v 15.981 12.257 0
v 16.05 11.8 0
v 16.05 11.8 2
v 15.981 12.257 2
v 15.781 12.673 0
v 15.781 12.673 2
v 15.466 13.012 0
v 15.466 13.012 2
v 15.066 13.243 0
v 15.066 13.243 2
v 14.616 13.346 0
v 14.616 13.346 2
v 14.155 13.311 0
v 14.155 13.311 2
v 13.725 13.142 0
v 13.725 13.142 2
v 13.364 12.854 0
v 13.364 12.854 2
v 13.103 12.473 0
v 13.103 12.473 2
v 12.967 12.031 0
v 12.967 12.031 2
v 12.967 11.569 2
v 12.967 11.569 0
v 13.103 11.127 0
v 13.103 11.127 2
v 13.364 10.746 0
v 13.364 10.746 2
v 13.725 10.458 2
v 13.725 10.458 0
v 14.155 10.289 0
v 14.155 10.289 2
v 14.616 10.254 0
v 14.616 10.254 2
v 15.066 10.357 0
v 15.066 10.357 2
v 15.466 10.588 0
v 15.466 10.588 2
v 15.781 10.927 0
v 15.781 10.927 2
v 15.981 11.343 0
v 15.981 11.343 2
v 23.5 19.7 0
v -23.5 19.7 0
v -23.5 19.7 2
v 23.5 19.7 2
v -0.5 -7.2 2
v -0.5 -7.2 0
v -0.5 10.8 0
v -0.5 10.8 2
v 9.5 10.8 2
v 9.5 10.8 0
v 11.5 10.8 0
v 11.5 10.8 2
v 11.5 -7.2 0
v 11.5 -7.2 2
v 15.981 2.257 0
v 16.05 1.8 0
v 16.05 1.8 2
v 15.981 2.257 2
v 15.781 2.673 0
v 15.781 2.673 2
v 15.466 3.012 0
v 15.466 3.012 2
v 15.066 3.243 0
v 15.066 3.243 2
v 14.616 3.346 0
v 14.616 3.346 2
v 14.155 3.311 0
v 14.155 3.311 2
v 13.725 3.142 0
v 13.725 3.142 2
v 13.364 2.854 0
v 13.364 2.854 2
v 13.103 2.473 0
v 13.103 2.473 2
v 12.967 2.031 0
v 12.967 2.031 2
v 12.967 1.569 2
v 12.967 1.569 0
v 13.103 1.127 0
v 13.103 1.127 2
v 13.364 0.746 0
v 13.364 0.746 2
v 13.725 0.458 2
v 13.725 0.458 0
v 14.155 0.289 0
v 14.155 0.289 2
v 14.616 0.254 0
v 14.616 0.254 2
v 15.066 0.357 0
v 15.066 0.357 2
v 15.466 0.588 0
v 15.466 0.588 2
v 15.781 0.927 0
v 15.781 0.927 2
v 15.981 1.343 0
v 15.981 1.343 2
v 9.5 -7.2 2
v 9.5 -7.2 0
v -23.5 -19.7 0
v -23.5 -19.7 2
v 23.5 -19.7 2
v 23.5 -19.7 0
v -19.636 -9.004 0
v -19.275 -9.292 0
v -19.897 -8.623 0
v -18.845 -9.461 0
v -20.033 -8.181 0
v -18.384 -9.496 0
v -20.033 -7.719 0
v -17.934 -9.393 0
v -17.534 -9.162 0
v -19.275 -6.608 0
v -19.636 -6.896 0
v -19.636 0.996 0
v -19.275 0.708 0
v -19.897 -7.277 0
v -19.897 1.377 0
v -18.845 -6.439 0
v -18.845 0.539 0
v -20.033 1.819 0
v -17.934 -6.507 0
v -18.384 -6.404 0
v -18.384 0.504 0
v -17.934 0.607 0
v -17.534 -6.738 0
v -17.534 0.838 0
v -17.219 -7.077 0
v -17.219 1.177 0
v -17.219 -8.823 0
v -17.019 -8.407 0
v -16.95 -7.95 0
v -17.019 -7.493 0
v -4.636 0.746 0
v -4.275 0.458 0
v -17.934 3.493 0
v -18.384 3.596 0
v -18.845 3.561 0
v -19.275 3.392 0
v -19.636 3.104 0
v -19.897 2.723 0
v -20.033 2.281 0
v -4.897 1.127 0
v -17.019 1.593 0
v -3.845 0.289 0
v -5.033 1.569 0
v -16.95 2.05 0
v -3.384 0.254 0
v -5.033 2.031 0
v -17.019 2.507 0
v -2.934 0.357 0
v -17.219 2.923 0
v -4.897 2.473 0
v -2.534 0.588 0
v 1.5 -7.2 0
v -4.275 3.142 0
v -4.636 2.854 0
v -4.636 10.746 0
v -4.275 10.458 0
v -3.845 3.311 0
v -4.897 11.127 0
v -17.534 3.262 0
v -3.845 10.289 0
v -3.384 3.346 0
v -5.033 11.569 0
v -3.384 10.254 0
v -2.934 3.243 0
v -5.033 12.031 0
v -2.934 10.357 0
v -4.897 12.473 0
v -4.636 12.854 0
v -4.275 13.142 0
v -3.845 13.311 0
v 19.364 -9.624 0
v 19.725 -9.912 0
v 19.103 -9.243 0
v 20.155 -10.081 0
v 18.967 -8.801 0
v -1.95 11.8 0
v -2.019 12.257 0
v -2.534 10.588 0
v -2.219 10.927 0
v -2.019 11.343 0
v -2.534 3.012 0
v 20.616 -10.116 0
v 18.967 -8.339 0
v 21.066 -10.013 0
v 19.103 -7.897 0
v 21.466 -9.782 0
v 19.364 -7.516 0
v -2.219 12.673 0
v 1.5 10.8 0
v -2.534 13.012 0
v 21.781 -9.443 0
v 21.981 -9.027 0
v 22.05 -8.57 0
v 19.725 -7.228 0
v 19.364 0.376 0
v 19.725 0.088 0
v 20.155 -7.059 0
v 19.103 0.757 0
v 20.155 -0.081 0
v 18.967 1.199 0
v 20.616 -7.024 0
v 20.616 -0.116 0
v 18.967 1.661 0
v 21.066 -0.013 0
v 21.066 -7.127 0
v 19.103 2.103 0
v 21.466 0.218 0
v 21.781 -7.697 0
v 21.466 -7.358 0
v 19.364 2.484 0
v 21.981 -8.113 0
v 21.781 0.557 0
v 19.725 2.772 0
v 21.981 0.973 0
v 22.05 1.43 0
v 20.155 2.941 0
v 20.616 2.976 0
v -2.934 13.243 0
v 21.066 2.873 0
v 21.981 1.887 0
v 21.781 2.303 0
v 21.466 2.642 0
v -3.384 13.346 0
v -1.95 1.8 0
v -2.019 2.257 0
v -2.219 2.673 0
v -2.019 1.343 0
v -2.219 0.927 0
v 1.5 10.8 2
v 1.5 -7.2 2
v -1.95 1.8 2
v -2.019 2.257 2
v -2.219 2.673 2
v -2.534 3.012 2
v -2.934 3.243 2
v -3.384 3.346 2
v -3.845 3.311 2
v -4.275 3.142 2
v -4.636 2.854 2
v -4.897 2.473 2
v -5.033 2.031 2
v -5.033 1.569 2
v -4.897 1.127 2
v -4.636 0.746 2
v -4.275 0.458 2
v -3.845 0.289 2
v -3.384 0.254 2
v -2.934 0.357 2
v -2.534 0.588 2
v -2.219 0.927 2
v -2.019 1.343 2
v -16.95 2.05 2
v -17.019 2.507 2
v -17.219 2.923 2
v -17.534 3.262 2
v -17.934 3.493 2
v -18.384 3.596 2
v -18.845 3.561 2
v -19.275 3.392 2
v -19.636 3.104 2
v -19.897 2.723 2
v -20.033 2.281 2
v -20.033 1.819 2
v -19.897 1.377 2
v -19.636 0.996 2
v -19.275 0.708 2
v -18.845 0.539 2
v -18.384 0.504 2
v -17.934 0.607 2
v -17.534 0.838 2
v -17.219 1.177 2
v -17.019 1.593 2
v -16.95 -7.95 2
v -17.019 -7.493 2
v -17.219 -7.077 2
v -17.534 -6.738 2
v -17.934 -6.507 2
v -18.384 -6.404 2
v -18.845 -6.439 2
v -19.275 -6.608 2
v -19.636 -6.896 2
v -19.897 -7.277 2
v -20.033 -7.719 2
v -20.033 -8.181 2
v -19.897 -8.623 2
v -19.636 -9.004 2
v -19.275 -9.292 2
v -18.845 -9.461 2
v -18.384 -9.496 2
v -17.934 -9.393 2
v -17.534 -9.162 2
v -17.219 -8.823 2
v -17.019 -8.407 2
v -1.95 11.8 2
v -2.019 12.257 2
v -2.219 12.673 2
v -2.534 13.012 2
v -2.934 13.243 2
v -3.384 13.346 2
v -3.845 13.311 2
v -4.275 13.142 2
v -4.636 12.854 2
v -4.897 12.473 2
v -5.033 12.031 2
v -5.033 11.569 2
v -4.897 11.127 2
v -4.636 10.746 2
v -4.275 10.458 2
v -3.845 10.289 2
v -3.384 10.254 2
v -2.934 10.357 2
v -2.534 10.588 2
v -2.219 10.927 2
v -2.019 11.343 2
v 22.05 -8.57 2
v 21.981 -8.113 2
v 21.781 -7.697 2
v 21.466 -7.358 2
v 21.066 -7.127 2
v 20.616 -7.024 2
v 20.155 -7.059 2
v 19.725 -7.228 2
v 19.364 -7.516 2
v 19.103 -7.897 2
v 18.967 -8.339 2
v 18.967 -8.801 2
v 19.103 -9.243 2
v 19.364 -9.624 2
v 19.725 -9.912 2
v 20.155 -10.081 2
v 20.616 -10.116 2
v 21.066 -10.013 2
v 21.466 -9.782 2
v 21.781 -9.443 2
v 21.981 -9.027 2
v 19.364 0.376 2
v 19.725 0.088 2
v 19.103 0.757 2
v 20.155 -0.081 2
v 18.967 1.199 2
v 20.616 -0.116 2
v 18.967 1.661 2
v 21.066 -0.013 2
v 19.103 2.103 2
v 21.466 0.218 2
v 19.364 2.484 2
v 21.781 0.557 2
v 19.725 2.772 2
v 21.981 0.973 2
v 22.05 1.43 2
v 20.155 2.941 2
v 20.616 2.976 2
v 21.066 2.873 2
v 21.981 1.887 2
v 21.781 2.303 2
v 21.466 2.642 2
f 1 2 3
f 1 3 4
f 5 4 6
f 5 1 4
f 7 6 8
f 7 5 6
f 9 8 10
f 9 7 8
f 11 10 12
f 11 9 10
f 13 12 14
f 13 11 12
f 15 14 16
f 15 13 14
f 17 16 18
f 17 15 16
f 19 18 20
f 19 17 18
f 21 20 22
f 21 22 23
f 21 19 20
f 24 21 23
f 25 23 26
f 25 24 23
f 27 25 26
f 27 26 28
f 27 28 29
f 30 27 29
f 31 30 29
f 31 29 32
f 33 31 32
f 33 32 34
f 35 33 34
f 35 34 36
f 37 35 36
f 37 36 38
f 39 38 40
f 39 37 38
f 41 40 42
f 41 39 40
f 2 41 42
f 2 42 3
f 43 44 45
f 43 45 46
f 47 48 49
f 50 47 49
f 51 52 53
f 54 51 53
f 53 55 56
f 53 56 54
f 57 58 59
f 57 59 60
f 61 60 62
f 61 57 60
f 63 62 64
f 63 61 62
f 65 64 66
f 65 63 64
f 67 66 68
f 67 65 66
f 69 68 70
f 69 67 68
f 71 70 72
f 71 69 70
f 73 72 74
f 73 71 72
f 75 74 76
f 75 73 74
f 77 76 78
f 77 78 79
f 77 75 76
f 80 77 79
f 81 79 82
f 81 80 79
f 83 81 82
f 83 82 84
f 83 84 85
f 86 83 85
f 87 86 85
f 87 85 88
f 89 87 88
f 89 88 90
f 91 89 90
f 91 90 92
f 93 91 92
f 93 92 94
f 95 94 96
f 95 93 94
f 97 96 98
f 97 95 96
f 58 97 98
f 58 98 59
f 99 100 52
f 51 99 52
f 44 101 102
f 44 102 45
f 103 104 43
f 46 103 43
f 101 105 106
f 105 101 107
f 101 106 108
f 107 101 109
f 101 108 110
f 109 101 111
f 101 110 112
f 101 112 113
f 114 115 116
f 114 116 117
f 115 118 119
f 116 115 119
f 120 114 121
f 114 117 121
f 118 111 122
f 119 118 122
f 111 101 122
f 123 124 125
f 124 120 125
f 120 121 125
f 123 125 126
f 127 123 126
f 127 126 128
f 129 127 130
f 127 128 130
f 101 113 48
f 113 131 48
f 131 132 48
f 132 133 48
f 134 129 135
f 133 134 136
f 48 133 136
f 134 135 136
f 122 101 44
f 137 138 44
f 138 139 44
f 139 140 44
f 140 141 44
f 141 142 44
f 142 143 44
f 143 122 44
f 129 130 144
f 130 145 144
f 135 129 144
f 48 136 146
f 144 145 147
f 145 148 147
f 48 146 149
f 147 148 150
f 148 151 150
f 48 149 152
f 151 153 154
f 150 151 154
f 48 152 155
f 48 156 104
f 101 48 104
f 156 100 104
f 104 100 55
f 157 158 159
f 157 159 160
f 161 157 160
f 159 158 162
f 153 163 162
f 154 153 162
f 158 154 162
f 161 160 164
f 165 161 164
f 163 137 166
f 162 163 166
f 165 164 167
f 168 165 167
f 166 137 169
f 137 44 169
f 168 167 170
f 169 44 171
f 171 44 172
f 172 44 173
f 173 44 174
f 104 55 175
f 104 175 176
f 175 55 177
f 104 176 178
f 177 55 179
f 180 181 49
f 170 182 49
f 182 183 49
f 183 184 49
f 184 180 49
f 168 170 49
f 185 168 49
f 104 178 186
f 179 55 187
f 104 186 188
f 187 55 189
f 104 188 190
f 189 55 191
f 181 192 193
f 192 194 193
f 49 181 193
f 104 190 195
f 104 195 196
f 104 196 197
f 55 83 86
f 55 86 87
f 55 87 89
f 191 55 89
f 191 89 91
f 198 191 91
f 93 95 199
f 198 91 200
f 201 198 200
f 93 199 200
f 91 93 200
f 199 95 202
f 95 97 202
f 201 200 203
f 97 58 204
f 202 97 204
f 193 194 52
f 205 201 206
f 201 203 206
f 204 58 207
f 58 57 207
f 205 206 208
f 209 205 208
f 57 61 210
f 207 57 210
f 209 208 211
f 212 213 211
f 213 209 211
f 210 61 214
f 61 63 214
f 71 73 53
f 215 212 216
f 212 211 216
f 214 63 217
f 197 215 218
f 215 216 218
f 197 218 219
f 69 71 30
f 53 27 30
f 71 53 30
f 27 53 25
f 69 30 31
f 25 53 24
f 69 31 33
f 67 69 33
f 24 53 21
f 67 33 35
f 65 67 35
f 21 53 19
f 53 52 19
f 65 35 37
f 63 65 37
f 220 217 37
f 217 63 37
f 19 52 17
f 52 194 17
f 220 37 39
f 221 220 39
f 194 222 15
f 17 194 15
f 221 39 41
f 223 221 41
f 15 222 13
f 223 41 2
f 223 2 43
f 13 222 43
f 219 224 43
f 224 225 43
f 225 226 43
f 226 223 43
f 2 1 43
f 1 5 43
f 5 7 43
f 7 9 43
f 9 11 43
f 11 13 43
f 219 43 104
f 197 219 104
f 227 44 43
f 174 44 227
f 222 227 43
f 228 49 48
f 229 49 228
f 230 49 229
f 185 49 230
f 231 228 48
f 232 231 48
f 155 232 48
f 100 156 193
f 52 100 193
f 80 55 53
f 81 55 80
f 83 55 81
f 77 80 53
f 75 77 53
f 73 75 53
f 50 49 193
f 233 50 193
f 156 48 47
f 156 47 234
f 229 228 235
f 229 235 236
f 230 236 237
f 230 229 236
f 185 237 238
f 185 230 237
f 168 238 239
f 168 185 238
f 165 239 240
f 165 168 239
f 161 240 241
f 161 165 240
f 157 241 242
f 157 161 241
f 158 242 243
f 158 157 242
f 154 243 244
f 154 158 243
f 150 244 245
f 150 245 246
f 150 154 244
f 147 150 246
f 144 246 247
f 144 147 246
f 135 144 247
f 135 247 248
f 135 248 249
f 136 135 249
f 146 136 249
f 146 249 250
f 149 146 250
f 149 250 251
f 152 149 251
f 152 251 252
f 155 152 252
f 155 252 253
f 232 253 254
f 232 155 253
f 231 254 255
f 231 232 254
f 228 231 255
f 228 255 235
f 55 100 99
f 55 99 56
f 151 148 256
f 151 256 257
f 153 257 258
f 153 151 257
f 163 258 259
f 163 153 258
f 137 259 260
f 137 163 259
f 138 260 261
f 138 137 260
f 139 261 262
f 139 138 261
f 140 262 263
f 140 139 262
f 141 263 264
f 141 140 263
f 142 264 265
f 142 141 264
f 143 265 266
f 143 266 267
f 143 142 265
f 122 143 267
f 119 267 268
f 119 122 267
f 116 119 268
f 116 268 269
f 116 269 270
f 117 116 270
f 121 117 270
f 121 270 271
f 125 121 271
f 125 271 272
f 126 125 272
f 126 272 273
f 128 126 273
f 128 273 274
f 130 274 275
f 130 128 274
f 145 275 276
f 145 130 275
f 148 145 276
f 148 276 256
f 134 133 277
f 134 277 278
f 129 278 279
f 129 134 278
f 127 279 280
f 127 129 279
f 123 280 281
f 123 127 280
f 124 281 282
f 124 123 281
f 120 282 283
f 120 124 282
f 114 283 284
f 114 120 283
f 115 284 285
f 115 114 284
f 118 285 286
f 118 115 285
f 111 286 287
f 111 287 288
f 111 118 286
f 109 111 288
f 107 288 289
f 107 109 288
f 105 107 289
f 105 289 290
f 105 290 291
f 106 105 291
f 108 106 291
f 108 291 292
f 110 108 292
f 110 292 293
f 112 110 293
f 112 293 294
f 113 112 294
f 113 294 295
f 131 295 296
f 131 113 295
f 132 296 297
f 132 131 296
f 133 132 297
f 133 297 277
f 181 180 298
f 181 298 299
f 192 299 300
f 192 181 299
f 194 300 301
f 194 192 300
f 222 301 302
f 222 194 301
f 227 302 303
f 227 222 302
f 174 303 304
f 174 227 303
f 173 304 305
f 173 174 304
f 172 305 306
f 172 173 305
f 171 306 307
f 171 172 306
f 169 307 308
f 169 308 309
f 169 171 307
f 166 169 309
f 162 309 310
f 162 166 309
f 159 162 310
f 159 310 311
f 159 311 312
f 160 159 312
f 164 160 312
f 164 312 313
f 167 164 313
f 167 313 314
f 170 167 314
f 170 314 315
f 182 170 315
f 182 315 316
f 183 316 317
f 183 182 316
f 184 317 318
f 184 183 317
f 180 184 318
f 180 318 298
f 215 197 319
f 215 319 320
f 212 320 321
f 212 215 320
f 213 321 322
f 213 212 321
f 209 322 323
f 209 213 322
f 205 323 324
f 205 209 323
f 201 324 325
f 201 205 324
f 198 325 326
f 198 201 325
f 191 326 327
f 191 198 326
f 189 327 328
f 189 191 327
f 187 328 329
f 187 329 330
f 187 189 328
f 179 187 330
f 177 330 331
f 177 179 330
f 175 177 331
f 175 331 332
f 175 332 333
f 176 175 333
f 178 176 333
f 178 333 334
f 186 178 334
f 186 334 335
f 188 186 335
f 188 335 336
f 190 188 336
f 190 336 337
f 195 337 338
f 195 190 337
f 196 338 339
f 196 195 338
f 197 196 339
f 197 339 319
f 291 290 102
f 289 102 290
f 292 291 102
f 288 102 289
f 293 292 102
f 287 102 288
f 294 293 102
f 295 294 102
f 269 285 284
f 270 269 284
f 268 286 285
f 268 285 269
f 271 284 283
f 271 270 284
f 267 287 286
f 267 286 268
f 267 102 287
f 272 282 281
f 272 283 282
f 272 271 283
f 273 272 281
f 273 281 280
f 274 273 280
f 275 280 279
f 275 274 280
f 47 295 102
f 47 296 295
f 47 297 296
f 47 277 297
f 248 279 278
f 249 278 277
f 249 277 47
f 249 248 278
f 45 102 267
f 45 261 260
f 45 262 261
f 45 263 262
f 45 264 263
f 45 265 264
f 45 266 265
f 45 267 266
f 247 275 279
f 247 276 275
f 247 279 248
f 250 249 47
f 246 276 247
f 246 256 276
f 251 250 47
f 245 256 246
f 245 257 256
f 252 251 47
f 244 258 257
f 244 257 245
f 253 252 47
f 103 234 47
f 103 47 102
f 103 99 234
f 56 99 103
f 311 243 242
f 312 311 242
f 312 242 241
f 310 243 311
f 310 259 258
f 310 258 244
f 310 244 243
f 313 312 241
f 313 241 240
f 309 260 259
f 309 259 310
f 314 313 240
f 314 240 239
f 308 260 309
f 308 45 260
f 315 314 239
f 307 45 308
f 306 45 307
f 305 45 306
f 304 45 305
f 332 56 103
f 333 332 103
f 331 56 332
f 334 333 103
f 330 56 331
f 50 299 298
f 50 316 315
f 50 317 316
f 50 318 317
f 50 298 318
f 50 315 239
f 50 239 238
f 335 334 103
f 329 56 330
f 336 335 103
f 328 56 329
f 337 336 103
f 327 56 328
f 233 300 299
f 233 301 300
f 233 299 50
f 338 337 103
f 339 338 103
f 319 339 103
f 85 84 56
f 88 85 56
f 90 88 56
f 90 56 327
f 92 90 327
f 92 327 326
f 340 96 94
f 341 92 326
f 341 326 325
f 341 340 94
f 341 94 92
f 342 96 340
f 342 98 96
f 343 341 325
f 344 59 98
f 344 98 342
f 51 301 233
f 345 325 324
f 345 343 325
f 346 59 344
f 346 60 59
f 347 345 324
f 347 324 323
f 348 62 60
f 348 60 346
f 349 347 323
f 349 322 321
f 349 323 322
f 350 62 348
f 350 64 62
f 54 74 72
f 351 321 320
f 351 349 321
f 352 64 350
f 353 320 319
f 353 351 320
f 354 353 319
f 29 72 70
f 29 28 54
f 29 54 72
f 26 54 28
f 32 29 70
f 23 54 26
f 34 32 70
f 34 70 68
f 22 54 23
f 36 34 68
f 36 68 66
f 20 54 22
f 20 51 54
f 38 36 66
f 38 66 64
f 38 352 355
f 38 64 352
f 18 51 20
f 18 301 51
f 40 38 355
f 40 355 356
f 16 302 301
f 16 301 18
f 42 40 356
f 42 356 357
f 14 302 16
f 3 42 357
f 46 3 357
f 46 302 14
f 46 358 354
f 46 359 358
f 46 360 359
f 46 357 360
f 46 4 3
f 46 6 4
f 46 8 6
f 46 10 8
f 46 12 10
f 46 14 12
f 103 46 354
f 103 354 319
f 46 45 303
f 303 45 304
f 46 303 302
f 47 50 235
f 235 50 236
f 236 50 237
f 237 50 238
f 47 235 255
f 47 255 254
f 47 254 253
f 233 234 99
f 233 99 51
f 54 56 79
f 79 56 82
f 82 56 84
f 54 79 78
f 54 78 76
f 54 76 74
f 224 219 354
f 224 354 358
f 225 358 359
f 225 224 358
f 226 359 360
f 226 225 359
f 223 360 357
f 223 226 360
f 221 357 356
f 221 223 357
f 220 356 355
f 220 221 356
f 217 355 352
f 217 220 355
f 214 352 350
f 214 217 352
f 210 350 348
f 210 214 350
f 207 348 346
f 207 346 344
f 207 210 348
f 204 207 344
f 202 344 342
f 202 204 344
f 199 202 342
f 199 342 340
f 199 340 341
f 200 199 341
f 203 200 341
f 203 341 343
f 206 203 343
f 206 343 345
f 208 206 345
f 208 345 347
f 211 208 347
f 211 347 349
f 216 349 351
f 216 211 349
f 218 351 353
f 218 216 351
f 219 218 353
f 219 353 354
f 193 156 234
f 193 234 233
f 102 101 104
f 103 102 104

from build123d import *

# Parameters (mm, degrees)
SKETCH_1_W      = 47
SKETCH_1_H      = 39.4
SKETCH_1_R      = 1.55
SKETCH_1_W_2    = 2
SKETCH_1_H_2    = 18
EXTRUDE_1_DEPTH = 2


with BuildPart() as part:
    # 草图1 → 凸台-拉伸1 (new body)
    with BuildSketch(Plane.XY):
        Rectangle(SKETCH_1_W, SKETCH_1_H)
        with Locations((20.5, 1.43)):
            Circle(SKETCH_1_R, mode=Mode.SUBTRACT)
        with Locations((20.5, -8.57)):
            Circle(SKETCH_1_R, mode=Mode.SUBTRACT)
        with Locations((-18.5, 2.05)):
            Circle(SKETCH_1_R, mode=Mode.SUBTRACT)
        with Locations((-18.5, -7.95)):
            Circle(SKETCH_1_R, mode=Mode.SUBTRACT)
        with Locations((-3.499999601, 11.8)):
            Circle(SKETCH_1_R, mode=Mode.SUBTRACT)
        with Locations((-3.5, 1.8)):
            Circle(SKETCH_1_R, mode=Mode.SUBTRACT)
        with Locations((14.5, 11.8)):
            Circle(SKETCH_1_R, mode=Mode.SUBTRACT)
        with Locations((14.5, 1.8)):
            Circle(SKETCH_1_R, mode=Mode.SUBTRACT)
        with Locations((10.5, 1.8)):
            Rectangle(SKETCH_1_W_2, SKETCH_1_H_2, mode=Mode.SUBTRACT)
        with Locations((0.5, 1.8)):
            Rectangle(SKETCH_1_W_2, SKETCH_1_H_2, mode=Mode.SUBTRACT)
    extrude(amount=EXTRUDE_1_DEPTH)


solid = part.part
